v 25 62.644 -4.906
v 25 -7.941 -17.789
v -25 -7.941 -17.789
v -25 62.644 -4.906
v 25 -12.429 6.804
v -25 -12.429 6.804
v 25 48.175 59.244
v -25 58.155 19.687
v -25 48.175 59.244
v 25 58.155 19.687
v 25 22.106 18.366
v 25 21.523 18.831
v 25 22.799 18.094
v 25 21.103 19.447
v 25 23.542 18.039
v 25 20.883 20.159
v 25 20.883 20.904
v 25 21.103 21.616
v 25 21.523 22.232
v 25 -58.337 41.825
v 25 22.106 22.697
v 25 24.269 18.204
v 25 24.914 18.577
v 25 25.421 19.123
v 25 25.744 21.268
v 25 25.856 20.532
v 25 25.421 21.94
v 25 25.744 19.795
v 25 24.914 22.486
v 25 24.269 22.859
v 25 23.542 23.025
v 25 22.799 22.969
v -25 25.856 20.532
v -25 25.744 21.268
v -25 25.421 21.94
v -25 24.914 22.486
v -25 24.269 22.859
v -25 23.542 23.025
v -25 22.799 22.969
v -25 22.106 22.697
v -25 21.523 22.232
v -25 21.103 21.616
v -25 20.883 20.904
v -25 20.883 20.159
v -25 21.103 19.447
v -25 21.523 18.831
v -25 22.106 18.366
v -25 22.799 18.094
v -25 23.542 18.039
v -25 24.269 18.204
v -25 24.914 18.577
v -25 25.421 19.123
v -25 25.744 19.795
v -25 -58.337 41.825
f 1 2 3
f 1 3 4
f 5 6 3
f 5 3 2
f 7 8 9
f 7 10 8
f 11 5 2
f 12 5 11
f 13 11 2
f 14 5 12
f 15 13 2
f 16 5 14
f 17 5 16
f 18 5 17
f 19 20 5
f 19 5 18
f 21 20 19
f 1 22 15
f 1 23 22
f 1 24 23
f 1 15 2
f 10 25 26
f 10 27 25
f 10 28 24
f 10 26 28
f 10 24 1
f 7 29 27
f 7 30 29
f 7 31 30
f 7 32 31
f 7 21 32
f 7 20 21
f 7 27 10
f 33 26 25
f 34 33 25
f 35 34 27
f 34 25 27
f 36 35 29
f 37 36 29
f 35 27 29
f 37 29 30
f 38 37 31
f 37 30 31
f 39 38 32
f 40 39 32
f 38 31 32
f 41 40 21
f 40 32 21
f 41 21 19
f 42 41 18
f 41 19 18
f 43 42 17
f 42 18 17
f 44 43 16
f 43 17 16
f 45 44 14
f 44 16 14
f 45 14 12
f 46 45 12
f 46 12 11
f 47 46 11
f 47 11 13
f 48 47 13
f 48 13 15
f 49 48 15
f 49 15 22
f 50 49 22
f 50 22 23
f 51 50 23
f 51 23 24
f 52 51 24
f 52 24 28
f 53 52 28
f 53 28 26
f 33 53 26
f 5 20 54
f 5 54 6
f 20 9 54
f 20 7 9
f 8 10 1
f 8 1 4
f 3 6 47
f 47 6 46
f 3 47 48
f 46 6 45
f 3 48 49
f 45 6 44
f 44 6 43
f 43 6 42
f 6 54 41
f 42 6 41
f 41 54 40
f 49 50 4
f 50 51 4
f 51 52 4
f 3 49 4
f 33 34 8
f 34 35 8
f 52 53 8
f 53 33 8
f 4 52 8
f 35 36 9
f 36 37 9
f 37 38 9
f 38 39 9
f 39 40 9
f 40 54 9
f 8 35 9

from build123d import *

# Parameters (mm, degrees)
F1_DEPTH      = 25
F1_DEPTH_BACK = 25
F2_DEPTH      = 25
F4_D          = 5


with BuildPart() as f1:
    # F0 (on Right) → F1 (new body, two sides)
    with BuildSketch(Plane.YZ) as f1_sk:
        Polygon((48.1754057109, 59.2439547181), (-58.3366975188, 41.8245978653), (-12.4294357374, 6.8044359796), (58.1552386284, 19.687499851), align=None)
    extrude(amount=F1_DEPTH)
    extrude(f1_sk.sketch, amount=-F1_DEPTH_BACK)

    # F2 (add): a face of the model
    f2_faces = [f1.faces().sort_by_distance(p)[0] for p in [
        (0, 22.8629014455, 13.2459679153),
    ]]
    extrude(f2_faces, amount=F2_DEPTH)

    # F4 (through all)
    with Locations(Plane(origin=(-25, 0, 0), x_dir=(0, -1, 0), z_dir=(-1, 0, 0))):
        with Locations((-23.3555603772, 20.5315314233)):
            Hole(F4_D / 2)


solid = f1.part
